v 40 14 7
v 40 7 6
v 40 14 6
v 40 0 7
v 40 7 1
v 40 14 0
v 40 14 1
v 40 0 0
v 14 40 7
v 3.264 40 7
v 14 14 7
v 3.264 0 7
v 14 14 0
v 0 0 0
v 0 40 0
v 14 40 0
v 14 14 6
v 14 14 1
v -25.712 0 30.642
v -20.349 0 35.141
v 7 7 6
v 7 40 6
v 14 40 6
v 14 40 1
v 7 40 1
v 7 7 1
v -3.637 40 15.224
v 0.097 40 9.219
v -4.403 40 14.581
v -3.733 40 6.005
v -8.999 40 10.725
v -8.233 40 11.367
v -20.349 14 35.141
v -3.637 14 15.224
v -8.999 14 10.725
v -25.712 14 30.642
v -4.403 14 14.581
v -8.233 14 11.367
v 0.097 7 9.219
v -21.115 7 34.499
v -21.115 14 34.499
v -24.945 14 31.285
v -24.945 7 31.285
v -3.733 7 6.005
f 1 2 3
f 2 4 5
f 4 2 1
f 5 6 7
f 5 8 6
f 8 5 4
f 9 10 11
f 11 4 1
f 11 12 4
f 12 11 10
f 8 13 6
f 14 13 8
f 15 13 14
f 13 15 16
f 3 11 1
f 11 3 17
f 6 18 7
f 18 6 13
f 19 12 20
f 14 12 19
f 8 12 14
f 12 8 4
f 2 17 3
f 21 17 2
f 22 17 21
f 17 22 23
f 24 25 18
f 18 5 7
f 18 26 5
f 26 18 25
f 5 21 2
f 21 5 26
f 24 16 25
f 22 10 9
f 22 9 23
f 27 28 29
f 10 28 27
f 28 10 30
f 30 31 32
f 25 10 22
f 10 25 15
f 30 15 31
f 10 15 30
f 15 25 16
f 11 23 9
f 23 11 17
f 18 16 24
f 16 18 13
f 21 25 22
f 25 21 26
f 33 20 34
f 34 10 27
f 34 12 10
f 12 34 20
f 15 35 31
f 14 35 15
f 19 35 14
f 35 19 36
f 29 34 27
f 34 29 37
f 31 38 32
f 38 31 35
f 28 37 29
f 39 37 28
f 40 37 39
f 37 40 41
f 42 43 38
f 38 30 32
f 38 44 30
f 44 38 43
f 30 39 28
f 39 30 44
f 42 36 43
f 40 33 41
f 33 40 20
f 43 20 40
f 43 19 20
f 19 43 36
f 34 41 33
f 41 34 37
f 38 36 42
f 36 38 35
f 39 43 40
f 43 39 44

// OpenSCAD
// ---------------------------------------------
// CROSS-DEVICE BRACKETS
// Version 0.1, February 26, 2017
// ---------------------------------------------



//Number of brackets (all offset in 90 degrees)
brackets=2;//[1:4]

//Thickness of the outer border
border_width=7;//[4:20]

//Tablet cover width
cover_width=7;//[4:20]

//Thickness of the top and bottom layer
layer_thickness=1;//[2:10]

//Thickness of the device (e.g., Tablet)
device_thickness=5;//[3:30]

//Tilt angle (around x axis)
angle=50;//[0:90]

//Length of the brackt
length=40;//[20:100]


build_brackets(brackets, 
    border_width,
    cover_width,
    layer_thickness,
    device_thickness,
    angle, length);


// Build the complete, multi-element bracket
module build_brackets(brackets, 
    bw, cw,, lt, dt, angle, length)
{
    for (count =[0:brackets - 1]){
        if((count == 1) || (count == 2)) {    
            rotate([0 ,angle,0])
              rotate(count*90)
                build_bracket(bw, cw,, lt, dt, length);
        }
        else{
            rotate(count*90)
                build_bracket(bw, cw,, lt, dt, length);
        }          
    }
}

// Build a single L-shape bracket
module build_bracket(bw, cw, lt, dt, length){
    slide_bracket(bw, cw, lt, dt, length);
    mirror([1,-1,0])    
        slide_bracket(bw, cw, lt, dt, length);
}


// Build a single slide-in element for the tablet
module slide_bracket(bw, cw, lt, dt, length){  
    difference() {
        cube([length, bw+cw, (dt + 2*lt)]);
        translate([0, bw, lt])
            cube([length, cw, dt]);
    }  
}
